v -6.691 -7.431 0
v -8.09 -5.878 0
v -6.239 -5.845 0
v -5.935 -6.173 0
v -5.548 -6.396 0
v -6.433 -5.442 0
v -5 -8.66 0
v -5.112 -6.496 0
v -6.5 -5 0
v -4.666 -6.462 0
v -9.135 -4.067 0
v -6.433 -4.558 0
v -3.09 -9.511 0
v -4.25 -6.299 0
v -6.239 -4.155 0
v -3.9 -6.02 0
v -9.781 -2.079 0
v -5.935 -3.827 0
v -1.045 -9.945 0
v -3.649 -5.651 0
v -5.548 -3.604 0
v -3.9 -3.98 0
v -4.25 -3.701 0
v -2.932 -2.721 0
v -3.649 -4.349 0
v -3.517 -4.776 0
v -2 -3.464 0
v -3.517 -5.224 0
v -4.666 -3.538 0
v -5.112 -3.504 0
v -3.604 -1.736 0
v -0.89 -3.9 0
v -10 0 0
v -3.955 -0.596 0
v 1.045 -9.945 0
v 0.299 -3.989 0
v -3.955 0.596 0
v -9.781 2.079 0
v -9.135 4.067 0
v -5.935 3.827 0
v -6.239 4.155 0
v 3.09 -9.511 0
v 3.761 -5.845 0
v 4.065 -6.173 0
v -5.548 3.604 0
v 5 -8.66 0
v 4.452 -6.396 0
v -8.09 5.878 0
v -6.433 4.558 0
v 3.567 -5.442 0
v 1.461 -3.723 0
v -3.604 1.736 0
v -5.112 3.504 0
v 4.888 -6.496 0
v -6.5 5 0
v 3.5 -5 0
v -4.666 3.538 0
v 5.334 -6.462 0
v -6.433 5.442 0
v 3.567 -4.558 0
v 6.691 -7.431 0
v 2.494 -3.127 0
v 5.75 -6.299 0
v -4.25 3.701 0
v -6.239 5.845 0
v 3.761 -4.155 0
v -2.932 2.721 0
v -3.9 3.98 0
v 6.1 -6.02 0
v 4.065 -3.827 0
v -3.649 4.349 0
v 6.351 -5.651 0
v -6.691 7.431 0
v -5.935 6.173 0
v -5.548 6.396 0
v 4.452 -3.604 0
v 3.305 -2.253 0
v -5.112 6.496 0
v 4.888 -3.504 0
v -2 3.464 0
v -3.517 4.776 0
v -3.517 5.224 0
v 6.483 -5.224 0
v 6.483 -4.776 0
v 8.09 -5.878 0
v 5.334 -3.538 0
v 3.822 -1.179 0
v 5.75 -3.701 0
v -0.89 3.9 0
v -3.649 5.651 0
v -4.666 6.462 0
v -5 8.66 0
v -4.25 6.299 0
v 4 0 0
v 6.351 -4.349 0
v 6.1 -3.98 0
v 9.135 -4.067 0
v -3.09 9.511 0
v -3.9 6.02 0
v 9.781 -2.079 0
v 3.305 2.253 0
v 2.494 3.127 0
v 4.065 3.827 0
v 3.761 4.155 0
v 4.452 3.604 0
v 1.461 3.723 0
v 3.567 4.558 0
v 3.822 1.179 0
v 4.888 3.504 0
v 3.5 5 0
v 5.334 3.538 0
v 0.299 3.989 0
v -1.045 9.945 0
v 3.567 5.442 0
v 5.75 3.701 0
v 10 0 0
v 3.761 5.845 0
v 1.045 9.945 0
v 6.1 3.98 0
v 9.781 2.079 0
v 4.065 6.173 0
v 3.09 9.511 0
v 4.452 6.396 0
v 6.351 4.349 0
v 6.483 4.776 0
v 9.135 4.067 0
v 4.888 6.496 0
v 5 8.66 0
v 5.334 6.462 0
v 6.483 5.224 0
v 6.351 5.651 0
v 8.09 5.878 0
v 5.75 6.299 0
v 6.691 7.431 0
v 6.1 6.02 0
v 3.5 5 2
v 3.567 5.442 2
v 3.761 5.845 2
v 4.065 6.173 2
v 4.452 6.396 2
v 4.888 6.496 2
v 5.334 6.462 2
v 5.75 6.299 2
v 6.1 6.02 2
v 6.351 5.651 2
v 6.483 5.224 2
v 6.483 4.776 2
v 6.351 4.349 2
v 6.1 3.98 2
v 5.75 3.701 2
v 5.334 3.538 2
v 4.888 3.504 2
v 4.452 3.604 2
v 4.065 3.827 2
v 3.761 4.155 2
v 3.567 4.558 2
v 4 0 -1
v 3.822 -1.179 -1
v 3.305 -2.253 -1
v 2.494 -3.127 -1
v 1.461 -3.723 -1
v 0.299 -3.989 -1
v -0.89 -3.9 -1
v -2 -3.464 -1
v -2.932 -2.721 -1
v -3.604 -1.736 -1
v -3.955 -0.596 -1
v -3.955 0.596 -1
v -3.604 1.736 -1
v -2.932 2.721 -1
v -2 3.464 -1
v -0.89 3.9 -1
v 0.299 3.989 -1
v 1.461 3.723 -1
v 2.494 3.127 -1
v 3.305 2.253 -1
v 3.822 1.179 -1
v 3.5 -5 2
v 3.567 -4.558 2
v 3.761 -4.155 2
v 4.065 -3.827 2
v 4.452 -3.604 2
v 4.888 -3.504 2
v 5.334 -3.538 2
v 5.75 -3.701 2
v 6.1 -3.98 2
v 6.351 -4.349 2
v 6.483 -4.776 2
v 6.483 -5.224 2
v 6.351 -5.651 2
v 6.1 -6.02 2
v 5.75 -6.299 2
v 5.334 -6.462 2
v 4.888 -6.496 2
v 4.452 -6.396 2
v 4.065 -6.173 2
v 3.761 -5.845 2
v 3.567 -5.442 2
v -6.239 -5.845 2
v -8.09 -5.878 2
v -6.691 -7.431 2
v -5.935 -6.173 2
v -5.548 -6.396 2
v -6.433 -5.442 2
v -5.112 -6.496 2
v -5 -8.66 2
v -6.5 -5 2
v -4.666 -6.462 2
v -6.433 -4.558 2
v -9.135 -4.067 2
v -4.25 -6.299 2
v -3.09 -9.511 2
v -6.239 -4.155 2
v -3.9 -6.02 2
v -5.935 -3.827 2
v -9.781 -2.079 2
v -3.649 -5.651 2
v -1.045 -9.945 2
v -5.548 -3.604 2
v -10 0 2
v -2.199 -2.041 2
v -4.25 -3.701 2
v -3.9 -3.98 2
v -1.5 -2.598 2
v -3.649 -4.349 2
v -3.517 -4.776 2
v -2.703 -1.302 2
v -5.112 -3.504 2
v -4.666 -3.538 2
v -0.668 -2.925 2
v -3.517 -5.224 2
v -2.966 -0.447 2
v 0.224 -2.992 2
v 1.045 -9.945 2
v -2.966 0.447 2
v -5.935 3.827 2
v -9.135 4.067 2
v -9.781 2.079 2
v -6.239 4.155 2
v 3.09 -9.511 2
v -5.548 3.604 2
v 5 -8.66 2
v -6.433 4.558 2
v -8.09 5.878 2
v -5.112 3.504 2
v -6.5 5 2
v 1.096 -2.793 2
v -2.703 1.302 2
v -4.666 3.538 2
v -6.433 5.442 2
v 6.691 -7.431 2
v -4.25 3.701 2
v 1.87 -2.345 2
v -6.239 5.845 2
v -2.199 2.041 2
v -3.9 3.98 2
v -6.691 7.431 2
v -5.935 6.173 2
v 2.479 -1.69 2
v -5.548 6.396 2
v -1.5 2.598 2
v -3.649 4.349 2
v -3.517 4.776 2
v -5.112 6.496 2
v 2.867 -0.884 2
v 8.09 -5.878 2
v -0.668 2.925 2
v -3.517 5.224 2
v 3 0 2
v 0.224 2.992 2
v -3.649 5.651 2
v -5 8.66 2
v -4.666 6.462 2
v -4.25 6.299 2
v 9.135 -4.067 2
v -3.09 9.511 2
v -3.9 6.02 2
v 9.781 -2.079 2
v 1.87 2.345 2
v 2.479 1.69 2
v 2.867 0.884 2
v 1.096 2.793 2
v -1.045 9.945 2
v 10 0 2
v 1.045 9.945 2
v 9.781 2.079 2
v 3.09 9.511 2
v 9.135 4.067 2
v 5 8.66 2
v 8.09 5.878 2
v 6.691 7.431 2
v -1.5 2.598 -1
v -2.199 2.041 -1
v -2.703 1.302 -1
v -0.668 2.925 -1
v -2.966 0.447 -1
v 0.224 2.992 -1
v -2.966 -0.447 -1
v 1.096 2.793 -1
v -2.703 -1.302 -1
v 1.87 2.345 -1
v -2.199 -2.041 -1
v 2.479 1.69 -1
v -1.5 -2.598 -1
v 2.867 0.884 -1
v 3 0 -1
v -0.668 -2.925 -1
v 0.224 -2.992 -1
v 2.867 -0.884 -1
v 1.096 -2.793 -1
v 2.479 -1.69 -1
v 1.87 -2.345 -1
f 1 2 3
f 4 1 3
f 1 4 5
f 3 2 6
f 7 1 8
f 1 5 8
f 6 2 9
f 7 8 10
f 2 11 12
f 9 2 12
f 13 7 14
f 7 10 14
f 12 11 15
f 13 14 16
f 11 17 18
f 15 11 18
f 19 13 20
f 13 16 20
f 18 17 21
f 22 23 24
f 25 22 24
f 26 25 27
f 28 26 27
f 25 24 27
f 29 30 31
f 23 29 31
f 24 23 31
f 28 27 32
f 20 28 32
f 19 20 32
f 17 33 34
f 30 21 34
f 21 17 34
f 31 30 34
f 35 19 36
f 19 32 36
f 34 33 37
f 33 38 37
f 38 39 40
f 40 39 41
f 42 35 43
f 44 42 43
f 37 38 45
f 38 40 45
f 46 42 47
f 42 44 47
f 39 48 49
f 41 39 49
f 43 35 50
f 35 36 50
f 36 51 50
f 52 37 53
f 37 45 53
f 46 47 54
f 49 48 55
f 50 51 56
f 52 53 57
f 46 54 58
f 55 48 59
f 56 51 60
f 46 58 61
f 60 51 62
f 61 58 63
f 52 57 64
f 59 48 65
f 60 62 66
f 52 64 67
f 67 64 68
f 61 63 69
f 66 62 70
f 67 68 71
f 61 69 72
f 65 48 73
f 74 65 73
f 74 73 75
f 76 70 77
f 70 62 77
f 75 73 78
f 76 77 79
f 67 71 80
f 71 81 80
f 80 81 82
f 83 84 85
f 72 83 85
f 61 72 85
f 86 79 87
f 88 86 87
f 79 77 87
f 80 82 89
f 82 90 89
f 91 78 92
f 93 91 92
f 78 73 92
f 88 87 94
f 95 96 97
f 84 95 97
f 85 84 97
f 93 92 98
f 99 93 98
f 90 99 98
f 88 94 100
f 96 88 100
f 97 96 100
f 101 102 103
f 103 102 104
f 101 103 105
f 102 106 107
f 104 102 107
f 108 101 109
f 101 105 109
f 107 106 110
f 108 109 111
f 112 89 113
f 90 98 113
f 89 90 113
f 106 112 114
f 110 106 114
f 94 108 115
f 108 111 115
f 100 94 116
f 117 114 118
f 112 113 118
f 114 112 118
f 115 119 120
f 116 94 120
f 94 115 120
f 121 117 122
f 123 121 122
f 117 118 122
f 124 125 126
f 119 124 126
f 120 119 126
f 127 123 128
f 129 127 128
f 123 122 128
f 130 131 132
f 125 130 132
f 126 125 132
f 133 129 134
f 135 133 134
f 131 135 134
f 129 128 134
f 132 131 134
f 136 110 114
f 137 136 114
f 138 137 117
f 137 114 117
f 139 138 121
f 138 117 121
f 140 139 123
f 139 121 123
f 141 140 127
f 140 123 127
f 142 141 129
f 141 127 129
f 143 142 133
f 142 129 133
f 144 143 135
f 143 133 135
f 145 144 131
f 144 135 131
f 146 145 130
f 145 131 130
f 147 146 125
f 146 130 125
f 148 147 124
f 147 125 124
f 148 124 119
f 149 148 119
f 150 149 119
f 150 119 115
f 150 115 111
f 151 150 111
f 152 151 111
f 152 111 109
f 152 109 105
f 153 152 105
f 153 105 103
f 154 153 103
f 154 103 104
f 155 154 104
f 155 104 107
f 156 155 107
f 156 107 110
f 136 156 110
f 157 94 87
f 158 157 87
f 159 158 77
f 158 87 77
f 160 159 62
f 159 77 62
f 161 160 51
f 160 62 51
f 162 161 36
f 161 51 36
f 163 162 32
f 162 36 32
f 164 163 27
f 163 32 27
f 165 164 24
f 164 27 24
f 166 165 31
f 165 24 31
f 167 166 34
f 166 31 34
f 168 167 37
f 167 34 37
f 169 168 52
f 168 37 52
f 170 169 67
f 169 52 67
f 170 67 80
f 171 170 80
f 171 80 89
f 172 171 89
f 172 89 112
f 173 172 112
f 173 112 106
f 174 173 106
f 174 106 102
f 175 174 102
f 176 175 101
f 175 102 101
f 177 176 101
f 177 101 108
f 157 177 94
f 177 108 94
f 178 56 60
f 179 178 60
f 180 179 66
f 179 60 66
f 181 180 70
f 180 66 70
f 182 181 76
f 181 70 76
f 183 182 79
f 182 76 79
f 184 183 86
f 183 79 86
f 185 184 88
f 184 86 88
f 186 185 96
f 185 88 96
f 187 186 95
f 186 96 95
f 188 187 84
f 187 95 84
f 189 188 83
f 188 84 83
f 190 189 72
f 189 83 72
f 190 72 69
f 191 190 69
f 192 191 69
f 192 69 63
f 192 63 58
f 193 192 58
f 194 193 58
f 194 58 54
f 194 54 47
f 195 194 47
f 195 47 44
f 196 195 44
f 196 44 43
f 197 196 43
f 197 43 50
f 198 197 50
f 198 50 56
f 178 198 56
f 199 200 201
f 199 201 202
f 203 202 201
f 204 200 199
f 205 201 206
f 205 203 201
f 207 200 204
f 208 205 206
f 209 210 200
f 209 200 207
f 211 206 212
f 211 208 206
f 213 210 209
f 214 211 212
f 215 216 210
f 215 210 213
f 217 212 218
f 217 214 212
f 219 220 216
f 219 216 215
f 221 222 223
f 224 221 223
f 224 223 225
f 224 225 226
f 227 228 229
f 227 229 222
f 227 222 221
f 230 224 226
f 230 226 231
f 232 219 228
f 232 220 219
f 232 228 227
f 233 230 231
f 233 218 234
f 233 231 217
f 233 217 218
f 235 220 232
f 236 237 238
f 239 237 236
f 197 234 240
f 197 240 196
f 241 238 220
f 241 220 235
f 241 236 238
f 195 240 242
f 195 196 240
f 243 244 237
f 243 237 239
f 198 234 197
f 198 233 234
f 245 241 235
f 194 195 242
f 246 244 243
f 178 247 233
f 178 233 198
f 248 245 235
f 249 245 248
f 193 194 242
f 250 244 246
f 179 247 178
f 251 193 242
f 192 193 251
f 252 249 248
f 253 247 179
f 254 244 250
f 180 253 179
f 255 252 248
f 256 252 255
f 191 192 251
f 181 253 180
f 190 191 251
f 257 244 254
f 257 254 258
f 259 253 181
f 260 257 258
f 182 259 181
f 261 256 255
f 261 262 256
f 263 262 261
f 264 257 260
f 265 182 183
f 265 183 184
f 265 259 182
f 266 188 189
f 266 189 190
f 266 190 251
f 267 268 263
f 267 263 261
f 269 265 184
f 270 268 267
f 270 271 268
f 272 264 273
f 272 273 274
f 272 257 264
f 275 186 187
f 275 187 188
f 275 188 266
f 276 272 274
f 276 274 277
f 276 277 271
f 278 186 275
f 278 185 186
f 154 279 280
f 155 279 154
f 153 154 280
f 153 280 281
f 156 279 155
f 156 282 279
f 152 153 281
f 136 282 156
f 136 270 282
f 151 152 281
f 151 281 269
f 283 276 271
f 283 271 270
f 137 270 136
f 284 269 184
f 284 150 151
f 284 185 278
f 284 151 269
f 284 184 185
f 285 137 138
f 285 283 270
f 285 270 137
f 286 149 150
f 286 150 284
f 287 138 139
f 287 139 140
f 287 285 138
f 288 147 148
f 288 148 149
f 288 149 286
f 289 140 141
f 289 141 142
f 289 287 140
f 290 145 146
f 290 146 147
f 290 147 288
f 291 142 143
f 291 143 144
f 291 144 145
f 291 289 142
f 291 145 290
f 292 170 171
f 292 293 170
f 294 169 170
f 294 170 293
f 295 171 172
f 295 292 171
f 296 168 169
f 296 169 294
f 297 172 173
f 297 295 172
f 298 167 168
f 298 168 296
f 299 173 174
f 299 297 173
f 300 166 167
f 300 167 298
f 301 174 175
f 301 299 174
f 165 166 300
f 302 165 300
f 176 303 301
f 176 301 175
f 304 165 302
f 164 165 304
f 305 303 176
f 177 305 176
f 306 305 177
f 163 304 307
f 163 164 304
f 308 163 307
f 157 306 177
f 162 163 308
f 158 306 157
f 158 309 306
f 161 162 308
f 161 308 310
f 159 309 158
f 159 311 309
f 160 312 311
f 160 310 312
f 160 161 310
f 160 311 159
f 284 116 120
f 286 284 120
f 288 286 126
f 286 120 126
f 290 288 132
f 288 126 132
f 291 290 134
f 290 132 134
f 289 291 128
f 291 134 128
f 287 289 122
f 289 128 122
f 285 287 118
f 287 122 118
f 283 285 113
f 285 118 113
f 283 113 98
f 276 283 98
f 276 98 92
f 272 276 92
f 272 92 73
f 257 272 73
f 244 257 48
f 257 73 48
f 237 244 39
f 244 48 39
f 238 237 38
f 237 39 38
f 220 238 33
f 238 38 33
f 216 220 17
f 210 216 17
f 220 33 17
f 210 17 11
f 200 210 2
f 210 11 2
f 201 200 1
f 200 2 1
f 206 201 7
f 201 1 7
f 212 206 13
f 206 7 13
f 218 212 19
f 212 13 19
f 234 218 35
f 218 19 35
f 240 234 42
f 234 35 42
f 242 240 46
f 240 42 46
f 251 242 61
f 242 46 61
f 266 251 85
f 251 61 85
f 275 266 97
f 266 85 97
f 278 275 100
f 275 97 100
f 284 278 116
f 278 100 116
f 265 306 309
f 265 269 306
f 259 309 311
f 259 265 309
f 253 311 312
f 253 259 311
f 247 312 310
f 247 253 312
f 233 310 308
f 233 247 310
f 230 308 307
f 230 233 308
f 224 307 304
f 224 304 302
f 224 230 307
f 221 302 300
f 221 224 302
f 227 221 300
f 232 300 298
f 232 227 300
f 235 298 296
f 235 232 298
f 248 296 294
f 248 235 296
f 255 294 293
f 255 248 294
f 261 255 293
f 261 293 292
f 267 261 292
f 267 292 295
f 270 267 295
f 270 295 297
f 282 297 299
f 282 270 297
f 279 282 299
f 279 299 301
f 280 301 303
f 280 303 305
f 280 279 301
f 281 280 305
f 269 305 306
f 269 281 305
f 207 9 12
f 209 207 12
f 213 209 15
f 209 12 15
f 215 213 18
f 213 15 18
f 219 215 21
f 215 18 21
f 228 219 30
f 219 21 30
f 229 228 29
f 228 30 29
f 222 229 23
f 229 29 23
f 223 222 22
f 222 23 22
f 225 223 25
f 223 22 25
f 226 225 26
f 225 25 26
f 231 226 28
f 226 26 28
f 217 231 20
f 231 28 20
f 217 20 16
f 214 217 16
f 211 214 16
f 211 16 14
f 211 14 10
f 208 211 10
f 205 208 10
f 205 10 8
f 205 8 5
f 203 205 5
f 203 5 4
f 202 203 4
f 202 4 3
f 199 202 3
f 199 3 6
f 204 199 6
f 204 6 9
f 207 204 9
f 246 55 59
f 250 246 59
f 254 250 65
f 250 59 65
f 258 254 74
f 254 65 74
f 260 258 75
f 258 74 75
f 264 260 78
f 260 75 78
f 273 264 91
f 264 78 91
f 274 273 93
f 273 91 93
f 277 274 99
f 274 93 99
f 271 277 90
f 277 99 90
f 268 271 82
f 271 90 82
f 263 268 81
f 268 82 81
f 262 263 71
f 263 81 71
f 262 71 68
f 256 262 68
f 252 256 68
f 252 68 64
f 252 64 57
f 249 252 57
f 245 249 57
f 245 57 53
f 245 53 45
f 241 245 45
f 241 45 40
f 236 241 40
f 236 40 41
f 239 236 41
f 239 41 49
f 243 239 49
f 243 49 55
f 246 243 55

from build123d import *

# Parameters (mm, degrees)
F0_R     = 10
F0_R_2   = 3
F1_DEPTH = 2
F3_D     = 3
F4_R     = 4
F4_R_2   = 3
F5_DEPTH = 1


with BuildPart() as f1:
    # F0 (on Top) → F1 (new body)
    with BuildSketch(Plane.XY):
        Circle(F0_R)
        Circle(F0_R_2, mode=Mode.SUBTRACT)
    extrude(amount=F1_DEPTH)

    # F3 (through all)
    with Locations(Plane.XY.offset(2)):
        with Locations((-5, 5), (5, 5), (5, -5), (-5, -5)):
            Hole(F3_D / 2)

    # F4 (on face) → F5 (join)
    with BuildSketch(Plane(origin=(0, 0, 0), x_dir=(1, 0, 0), z_dir=(0, 0, -1))):
        Circle(F4_R)
        Circle(F4_R_2, mode=Mode.SUBTRACT)
    extrude(amount=F5_DEPTH)


solid = f1.part
